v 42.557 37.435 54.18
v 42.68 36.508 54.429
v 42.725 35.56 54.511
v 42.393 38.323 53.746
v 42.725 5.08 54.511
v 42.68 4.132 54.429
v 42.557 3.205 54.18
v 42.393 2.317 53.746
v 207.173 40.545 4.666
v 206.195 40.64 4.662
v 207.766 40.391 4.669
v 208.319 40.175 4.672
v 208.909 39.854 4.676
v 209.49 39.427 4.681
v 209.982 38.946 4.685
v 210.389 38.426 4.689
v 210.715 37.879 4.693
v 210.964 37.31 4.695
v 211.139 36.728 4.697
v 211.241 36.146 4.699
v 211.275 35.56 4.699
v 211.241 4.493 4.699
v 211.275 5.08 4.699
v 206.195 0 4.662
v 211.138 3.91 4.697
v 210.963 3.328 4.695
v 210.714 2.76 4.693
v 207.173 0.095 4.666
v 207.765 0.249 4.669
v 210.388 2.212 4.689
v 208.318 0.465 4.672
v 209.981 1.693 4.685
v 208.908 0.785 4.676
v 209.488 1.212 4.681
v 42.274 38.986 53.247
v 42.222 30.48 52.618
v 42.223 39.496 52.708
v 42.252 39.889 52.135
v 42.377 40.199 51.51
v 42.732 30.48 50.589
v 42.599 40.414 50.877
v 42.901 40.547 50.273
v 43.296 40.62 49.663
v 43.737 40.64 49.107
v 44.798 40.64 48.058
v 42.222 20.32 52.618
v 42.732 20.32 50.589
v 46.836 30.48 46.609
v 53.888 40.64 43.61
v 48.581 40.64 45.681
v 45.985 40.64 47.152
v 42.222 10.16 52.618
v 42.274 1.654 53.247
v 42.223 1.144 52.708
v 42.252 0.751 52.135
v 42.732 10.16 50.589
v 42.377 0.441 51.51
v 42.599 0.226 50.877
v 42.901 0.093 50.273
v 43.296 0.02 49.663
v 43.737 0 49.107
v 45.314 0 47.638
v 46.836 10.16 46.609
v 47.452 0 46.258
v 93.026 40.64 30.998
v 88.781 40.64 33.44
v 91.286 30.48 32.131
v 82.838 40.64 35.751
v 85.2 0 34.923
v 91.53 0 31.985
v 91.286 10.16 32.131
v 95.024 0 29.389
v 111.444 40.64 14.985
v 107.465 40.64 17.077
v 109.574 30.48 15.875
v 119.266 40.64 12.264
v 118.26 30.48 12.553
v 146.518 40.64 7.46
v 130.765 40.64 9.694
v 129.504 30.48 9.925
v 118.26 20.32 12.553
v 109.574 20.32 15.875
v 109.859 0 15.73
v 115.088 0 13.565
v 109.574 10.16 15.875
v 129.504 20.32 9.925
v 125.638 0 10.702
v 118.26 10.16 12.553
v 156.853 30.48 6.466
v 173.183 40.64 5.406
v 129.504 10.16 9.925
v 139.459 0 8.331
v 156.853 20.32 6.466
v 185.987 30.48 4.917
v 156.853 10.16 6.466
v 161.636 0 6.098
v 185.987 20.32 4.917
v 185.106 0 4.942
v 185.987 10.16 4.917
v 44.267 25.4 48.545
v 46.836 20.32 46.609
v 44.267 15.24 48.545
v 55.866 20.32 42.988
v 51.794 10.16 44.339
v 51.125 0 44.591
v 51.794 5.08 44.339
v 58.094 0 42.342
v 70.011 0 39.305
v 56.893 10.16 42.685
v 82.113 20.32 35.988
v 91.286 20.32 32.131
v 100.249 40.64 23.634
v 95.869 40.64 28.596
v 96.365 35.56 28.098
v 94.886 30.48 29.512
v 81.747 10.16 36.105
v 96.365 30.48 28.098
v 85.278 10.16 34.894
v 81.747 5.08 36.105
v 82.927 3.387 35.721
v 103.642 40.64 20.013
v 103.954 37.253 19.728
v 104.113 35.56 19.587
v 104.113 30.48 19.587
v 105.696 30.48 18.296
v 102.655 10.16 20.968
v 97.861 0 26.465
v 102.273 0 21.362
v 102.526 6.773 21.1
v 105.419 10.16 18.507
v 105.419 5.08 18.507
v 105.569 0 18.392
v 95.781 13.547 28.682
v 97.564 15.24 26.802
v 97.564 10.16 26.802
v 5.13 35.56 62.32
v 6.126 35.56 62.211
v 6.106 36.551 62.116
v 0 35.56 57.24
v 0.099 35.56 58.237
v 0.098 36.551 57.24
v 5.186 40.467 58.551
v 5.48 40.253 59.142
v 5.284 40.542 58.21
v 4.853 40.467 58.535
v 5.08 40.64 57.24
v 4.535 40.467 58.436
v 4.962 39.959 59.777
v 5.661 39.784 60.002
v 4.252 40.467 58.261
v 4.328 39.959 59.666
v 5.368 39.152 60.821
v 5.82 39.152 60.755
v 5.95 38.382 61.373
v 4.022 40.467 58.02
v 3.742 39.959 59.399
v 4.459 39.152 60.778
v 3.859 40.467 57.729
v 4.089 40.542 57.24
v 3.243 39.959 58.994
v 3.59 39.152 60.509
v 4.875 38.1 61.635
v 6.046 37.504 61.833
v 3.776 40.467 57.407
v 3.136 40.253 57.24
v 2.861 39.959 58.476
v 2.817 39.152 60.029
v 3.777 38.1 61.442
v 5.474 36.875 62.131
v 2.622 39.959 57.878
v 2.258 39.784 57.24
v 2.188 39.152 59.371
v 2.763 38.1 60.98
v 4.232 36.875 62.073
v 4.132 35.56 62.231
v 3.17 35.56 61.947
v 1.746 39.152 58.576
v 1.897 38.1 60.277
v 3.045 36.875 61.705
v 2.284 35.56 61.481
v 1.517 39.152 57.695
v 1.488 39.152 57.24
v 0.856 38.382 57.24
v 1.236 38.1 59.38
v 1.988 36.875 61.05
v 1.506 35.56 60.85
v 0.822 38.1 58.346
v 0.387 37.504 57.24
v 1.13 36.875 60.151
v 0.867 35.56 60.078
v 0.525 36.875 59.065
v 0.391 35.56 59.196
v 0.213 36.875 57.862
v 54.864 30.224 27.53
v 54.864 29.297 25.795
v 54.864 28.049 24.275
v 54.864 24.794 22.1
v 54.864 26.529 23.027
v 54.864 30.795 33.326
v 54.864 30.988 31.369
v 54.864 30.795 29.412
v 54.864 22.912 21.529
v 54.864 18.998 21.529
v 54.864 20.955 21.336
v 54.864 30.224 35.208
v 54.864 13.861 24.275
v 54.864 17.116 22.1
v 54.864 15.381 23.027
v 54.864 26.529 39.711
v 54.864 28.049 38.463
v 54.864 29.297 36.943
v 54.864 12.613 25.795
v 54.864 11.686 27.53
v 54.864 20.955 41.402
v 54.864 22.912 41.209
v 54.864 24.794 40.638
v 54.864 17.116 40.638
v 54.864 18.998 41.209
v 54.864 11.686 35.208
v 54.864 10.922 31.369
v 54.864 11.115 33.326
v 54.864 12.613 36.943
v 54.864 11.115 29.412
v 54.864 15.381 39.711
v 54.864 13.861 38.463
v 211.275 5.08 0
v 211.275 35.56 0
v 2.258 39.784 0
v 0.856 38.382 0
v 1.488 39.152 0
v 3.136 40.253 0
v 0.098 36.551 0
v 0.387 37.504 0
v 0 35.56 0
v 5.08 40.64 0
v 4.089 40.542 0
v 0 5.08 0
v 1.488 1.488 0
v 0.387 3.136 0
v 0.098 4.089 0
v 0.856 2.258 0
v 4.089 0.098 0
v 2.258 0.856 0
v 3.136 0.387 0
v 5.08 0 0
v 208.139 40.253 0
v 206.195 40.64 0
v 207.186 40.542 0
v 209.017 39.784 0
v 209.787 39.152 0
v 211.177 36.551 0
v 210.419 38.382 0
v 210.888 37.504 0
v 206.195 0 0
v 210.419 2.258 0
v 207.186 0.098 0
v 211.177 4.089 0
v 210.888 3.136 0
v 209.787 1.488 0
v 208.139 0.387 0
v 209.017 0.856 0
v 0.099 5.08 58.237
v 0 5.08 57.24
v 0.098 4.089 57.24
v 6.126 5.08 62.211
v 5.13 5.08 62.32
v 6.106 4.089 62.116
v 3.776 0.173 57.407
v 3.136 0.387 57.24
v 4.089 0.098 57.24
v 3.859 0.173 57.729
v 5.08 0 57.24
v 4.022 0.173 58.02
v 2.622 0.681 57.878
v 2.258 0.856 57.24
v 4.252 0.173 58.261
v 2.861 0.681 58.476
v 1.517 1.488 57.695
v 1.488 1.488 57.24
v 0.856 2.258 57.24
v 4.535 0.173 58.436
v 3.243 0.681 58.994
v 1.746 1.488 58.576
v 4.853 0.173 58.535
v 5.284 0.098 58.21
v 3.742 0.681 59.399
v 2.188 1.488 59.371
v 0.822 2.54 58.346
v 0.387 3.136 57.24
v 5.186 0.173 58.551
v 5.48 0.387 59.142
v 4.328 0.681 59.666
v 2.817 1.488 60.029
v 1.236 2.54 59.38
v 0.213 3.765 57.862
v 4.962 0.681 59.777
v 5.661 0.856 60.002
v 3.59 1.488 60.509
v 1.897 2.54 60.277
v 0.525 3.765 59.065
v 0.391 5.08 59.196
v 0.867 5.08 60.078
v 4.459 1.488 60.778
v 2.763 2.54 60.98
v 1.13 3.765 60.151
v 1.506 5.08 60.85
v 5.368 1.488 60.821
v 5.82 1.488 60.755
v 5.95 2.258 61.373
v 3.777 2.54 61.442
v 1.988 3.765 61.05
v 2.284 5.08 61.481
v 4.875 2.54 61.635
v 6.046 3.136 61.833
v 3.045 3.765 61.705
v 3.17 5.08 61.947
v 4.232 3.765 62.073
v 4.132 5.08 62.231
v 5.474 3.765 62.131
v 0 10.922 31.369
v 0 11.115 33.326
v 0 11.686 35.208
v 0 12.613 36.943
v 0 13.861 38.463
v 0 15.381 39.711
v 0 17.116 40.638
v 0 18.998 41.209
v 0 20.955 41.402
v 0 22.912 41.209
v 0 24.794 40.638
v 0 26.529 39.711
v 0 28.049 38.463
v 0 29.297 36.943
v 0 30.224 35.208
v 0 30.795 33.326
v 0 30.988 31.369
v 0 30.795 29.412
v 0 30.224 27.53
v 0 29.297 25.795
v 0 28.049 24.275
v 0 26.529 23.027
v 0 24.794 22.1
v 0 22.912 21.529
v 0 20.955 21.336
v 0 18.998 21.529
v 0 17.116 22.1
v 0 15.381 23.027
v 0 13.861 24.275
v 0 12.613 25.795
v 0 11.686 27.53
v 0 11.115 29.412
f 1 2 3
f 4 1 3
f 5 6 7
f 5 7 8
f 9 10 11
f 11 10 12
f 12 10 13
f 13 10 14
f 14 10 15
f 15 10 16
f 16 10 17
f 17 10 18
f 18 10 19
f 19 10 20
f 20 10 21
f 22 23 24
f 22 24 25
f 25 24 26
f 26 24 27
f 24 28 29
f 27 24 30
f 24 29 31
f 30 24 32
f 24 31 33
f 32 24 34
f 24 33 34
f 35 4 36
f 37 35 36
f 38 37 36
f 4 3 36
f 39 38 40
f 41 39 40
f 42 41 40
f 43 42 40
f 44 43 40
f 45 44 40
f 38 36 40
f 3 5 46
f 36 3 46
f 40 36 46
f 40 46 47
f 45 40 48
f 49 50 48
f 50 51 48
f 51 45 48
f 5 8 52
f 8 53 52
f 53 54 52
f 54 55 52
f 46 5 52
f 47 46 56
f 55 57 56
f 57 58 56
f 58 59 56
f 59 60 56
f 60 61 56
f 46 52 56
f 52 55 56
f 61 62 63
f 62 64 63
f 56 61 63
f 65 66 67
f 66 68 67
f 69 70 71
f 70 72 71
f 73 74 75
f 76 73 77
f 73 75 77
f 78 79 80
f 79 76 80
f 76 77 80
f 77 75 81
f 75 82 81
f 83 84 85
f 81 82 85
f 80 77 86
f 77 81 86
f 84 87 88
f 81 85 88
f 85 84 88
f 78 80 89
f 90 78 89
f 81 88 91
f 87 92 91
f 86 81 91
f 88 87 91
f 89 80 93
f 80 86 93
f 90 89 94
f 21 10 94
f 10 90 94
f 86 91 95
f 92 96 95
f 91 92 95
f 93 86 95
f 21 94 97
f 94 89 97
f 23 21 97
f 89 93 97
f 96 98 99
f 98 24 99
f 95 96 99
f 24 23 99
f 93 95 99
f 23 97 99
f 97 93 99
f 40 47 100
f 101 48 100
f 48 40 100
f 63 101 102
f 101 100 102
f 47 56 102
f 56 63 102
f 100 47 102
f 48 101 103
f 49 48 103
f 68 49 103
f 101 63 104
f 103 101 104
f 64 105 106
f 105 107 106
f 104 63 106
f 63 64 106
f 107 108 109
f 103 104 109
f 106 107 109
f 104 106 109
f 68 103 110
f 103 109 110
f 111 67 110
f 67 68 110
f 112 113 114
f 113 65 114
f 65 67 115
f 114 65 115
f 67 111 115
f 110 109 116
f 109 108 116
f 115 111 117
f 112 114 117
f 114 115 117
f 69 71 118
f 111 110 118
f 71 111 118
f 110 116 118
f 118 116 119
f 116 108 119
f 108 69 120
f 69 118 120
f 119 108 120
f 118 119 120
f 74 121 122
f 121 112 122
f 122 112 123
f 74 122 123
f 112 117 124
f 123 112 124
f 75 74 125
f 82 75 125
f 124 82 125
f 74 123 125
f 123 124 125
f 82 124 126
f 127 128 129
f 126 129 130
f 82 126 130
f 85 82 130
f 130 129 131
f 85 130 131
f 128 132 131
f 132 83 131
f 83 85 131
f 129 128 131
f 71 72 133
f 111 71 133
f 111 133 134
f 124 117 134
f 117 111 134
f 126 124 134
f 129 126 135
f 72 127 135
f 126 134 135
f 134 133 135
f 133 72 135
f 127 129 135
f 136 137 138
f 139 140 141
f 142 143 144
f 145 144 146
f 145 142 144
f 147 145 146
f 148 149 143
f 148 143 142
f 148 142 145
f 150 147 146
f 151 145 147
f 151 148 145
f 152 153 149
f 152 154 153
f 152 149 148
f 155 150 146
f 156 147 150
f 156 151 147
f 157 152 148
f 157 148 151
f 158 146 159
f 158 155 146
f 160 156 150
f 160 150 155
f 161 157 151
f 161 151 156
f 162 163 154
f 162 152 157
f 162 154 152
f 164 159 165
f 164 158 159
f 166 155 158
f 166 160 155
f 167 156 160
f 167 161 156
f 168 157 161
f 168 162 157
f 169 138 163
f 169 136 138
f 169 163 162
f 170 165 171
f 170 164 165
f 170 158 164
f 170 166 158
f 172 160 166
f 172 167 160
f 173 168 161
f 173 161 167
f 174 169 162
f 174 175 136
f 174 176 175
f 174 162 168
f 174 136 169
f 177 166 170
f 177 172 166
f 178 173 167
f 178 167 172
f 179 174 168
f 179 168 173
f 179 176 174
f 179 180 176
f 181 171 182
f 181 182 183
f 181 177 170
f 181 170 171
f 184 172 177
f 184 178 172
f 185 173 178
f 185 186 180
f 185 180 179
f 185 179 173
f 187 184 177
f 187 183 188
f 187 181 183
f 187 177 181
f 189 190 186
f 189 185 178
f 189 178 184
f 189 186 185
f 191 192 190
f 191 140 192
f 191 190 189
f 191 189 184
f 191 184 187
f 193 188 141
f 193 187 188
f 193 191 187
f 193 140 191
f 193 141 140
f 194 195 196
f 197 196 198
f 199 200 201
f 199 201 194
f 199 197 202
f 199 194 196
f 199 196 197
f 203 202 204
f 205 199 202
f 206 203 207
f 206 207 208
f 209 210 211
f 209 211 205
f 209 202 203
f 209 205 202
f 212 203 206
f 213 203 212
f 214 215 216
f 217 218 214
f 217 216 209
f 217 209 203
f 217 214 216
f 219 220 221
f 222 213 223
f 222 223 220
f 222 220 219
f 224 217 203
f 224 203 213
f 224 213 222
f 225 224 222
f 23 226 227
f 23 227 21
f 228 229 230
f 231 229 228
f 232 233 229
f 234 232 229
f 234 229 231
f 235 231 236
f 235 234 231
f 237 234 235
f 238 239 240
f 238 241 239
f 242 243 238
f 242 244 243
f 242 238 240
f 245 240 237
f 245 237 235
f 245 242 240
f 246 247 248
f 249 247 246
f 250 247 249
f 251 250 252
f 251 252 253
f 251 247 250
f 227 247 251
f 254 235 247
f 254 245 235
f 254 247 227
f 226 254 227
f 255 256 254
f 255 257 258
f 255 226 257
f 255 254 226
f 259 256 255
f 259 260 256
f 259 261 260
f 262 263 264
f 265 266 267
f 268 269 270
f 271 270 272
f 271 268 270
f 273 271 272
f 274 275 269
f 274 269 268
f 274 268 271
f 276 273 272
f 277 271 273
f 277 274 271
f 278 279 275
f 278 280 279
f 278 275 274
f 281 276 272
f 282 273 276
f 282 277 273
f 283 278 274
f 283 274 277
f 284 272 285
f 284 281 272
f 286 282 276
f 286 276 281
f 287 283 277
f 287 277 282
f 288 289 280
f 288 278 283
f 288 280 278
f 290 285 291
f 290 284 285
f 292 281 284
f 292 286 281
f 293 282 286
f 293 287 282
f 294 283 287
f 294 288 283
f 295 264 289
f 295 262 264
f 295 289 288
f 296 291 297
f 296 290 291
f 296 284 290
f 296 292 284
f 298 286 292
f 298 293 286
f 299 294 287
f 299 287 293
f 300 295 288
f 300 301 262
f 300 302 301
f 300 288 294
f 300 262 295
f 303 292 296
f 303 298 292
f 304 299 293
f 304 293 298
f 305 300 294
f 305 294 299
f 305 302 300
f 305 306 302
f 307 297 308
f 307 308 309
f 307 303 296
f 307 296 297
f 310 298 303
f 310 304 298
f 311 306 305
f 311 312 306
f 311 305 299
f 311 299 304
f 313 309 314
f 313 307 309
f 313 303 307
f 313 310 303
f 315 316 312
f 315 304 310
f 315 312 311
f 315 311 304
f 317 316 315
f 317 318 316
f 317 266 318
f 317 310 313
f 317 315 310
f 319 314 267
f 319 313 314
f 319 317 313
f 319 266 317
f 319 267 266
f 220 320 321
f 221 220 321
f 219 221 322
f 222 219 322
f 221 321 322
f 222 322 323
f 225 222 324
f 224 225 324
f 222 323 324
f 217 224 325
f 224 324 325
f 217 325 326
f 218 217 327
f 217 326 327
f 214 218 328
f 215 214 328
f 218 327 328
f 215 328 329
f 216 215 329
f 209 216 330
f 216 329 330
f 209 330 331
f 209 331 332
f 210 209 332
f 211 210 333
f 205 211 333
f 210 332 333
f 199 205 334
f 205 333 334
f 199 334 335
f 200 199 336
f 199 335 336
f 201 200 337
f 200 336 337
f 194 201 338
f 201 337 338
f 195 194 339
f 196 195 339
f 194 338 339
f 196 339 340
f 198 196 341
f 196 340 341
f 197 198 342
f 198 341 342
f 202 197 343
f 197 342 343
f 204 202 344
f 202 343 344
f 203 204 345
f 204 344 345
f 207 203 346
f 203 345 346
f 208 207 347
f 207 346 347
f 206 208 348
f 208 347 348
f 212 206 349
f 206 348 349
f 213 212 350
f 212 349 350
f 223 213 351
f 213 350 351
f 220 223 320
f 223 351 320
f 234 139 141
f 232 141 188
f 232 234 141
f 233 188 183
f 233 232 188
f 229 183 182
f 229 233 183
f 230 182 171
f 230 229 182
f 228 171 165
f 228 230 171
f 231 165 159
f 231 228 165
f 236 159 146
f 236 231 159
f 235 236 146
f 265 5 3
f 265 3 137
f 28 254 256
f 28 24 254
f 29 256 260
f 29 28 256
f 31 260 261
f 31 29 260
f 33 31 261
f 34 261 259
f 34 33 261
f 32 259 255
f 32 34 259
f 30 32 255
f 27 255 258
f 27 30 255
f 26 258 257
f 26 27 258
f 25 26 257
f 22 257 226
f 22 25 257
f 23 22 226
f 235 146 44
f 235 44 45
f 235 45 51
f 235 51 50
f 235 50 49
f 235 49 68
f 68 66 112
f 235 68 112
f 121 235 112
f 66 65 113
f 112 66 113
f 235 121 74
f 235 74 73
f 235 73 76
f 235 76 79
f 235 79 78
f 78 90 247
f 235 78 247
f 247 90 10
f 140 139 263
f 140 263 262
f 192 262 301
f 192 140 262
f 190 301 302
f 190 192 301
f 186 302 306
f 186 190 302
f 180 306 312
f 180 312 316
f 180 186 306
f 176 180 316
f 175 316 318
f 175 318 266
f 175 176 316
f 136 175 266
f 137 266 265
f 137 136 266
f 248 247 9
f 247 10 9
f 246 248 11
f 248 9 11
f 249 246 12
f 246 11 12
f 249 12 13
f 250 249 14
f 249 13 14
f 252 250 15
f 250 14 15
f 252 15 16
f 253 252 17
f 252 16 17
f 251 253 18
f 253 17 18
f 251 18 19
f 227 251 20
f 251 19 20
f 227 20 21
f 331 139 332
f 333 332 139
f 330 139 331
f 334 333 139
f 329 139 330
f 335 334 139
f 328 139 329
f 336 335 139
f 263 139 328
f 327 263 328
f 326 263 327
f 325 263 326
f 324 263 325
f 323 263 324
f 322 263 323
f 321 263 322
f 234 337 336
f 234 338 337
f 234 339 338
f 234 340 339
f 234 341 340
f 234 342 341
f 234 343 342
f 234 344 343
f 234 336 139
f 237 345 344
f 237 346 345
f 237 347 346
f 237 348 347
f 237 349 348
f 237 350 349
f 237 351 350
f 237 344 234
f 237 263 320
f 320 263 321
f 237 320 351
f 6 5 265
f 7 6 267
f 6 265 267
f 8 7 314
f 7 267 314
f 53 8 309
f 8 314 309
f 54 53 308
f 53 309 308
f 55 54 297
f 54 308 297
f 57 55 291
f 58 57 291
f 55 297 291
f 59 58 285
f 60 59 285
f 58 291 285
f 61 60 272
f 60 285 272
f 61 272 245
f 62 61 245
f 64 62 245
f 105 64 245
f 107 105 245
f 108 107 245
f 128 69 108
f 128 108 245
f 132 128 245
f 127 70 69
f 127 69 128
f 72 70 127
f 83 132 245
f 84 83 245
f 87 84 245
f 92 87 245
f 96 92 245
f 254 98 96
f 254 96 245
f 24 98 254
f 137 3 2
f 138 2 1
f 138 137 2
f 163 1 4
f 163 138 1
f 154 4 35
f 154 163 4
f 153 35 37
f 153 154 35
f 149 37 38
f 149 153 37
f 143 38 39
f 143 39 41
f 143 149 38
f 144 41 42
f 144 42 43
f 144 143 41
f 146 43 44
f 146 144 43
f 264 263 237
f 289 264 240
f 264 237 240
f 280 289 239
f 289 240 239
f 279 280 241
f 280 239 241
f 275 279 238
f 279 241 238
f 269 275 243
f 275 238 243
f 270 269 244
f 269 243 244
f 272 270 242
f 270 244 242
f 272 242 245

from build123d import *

# Parameters (mm, degrees)
F1_DEPTH = 40.64
F2_R     = 10.033
F3_DEPTH = 54.864
F5_DEPTH = 50.8
F10_R    = 5.08


# Not quite as in the source:
# - a feature of the source that left no trace in its solid (it failed there, or was rolled back) is left out


with BuildPart() as f1:
    # F0 (on Front) → F1 (new body)
    with BuildSketch(Plane.XZ):
        Polygon((0, 63.5), (0, 0), (211.2747204471, 0), (211.2747204471, 19.05), align=None)
    extrude(amount=-F1_DEPTH)

    # F2 (on face) → F3 (cut)
    with BuildSketch(Plane(origin=(0, 0, 0), x_dir=(0, -1, 0), z_dir=(-1, 0, 0))):
        with Locations((-20.9550000727, 31.3690006733)):
            Circle(F2_R)
    extrude(amount=-F3_DEPTH, mode=Mode.SUBTRACT)

    # F4 (on face) → F5 (cut)
    with BuildSketch(Plane.XZ):
        with BuildLine():
            Line((211.2747204471, 19.05), (42.7248373454, 54.5111393546))
            add(Edge.make_bspline(
                [(42.7248373454, 54.5111393546), (41.3835720379, 52.132302018), (45.7664482788, 42.0356948399), (97.7745530391, 36.833691871), (102.323893955, 6.8373724435), (182.6269030241, 4.3603729739), (211.2747204471, 4.6990001574)],
                knots=[0, 0, 0, 0, 0.0561852073, 0.1848977539, 0.2780173943, 0.468432753, 0.468432753, 0.468432753, 0.468432753], degree=3))
            Line((211.2747204471, 4.6990001574), (211.2747204471, 19.05))
        make_face()
    extrude(amount=-F5_DEPTH, mode=Mode.SUBTRACT)

    # F10
    f10_edges = [f1.edges().sort_by_distance(p)[0] for p in [
        (0, 0, 31.75),
        (21.362419, 0, 59.00557),
        (0, 20.32, 63.5),
        (21.362419, 40.64, 59.00557),
        (211.27472, 0, 2.3495),
        (0, 40.64, 31.75),
        (211.27472, 40.64, 2.3495),
    ]]
    fillet(f10_edges, radius=F10_R)


solid = f1.part
